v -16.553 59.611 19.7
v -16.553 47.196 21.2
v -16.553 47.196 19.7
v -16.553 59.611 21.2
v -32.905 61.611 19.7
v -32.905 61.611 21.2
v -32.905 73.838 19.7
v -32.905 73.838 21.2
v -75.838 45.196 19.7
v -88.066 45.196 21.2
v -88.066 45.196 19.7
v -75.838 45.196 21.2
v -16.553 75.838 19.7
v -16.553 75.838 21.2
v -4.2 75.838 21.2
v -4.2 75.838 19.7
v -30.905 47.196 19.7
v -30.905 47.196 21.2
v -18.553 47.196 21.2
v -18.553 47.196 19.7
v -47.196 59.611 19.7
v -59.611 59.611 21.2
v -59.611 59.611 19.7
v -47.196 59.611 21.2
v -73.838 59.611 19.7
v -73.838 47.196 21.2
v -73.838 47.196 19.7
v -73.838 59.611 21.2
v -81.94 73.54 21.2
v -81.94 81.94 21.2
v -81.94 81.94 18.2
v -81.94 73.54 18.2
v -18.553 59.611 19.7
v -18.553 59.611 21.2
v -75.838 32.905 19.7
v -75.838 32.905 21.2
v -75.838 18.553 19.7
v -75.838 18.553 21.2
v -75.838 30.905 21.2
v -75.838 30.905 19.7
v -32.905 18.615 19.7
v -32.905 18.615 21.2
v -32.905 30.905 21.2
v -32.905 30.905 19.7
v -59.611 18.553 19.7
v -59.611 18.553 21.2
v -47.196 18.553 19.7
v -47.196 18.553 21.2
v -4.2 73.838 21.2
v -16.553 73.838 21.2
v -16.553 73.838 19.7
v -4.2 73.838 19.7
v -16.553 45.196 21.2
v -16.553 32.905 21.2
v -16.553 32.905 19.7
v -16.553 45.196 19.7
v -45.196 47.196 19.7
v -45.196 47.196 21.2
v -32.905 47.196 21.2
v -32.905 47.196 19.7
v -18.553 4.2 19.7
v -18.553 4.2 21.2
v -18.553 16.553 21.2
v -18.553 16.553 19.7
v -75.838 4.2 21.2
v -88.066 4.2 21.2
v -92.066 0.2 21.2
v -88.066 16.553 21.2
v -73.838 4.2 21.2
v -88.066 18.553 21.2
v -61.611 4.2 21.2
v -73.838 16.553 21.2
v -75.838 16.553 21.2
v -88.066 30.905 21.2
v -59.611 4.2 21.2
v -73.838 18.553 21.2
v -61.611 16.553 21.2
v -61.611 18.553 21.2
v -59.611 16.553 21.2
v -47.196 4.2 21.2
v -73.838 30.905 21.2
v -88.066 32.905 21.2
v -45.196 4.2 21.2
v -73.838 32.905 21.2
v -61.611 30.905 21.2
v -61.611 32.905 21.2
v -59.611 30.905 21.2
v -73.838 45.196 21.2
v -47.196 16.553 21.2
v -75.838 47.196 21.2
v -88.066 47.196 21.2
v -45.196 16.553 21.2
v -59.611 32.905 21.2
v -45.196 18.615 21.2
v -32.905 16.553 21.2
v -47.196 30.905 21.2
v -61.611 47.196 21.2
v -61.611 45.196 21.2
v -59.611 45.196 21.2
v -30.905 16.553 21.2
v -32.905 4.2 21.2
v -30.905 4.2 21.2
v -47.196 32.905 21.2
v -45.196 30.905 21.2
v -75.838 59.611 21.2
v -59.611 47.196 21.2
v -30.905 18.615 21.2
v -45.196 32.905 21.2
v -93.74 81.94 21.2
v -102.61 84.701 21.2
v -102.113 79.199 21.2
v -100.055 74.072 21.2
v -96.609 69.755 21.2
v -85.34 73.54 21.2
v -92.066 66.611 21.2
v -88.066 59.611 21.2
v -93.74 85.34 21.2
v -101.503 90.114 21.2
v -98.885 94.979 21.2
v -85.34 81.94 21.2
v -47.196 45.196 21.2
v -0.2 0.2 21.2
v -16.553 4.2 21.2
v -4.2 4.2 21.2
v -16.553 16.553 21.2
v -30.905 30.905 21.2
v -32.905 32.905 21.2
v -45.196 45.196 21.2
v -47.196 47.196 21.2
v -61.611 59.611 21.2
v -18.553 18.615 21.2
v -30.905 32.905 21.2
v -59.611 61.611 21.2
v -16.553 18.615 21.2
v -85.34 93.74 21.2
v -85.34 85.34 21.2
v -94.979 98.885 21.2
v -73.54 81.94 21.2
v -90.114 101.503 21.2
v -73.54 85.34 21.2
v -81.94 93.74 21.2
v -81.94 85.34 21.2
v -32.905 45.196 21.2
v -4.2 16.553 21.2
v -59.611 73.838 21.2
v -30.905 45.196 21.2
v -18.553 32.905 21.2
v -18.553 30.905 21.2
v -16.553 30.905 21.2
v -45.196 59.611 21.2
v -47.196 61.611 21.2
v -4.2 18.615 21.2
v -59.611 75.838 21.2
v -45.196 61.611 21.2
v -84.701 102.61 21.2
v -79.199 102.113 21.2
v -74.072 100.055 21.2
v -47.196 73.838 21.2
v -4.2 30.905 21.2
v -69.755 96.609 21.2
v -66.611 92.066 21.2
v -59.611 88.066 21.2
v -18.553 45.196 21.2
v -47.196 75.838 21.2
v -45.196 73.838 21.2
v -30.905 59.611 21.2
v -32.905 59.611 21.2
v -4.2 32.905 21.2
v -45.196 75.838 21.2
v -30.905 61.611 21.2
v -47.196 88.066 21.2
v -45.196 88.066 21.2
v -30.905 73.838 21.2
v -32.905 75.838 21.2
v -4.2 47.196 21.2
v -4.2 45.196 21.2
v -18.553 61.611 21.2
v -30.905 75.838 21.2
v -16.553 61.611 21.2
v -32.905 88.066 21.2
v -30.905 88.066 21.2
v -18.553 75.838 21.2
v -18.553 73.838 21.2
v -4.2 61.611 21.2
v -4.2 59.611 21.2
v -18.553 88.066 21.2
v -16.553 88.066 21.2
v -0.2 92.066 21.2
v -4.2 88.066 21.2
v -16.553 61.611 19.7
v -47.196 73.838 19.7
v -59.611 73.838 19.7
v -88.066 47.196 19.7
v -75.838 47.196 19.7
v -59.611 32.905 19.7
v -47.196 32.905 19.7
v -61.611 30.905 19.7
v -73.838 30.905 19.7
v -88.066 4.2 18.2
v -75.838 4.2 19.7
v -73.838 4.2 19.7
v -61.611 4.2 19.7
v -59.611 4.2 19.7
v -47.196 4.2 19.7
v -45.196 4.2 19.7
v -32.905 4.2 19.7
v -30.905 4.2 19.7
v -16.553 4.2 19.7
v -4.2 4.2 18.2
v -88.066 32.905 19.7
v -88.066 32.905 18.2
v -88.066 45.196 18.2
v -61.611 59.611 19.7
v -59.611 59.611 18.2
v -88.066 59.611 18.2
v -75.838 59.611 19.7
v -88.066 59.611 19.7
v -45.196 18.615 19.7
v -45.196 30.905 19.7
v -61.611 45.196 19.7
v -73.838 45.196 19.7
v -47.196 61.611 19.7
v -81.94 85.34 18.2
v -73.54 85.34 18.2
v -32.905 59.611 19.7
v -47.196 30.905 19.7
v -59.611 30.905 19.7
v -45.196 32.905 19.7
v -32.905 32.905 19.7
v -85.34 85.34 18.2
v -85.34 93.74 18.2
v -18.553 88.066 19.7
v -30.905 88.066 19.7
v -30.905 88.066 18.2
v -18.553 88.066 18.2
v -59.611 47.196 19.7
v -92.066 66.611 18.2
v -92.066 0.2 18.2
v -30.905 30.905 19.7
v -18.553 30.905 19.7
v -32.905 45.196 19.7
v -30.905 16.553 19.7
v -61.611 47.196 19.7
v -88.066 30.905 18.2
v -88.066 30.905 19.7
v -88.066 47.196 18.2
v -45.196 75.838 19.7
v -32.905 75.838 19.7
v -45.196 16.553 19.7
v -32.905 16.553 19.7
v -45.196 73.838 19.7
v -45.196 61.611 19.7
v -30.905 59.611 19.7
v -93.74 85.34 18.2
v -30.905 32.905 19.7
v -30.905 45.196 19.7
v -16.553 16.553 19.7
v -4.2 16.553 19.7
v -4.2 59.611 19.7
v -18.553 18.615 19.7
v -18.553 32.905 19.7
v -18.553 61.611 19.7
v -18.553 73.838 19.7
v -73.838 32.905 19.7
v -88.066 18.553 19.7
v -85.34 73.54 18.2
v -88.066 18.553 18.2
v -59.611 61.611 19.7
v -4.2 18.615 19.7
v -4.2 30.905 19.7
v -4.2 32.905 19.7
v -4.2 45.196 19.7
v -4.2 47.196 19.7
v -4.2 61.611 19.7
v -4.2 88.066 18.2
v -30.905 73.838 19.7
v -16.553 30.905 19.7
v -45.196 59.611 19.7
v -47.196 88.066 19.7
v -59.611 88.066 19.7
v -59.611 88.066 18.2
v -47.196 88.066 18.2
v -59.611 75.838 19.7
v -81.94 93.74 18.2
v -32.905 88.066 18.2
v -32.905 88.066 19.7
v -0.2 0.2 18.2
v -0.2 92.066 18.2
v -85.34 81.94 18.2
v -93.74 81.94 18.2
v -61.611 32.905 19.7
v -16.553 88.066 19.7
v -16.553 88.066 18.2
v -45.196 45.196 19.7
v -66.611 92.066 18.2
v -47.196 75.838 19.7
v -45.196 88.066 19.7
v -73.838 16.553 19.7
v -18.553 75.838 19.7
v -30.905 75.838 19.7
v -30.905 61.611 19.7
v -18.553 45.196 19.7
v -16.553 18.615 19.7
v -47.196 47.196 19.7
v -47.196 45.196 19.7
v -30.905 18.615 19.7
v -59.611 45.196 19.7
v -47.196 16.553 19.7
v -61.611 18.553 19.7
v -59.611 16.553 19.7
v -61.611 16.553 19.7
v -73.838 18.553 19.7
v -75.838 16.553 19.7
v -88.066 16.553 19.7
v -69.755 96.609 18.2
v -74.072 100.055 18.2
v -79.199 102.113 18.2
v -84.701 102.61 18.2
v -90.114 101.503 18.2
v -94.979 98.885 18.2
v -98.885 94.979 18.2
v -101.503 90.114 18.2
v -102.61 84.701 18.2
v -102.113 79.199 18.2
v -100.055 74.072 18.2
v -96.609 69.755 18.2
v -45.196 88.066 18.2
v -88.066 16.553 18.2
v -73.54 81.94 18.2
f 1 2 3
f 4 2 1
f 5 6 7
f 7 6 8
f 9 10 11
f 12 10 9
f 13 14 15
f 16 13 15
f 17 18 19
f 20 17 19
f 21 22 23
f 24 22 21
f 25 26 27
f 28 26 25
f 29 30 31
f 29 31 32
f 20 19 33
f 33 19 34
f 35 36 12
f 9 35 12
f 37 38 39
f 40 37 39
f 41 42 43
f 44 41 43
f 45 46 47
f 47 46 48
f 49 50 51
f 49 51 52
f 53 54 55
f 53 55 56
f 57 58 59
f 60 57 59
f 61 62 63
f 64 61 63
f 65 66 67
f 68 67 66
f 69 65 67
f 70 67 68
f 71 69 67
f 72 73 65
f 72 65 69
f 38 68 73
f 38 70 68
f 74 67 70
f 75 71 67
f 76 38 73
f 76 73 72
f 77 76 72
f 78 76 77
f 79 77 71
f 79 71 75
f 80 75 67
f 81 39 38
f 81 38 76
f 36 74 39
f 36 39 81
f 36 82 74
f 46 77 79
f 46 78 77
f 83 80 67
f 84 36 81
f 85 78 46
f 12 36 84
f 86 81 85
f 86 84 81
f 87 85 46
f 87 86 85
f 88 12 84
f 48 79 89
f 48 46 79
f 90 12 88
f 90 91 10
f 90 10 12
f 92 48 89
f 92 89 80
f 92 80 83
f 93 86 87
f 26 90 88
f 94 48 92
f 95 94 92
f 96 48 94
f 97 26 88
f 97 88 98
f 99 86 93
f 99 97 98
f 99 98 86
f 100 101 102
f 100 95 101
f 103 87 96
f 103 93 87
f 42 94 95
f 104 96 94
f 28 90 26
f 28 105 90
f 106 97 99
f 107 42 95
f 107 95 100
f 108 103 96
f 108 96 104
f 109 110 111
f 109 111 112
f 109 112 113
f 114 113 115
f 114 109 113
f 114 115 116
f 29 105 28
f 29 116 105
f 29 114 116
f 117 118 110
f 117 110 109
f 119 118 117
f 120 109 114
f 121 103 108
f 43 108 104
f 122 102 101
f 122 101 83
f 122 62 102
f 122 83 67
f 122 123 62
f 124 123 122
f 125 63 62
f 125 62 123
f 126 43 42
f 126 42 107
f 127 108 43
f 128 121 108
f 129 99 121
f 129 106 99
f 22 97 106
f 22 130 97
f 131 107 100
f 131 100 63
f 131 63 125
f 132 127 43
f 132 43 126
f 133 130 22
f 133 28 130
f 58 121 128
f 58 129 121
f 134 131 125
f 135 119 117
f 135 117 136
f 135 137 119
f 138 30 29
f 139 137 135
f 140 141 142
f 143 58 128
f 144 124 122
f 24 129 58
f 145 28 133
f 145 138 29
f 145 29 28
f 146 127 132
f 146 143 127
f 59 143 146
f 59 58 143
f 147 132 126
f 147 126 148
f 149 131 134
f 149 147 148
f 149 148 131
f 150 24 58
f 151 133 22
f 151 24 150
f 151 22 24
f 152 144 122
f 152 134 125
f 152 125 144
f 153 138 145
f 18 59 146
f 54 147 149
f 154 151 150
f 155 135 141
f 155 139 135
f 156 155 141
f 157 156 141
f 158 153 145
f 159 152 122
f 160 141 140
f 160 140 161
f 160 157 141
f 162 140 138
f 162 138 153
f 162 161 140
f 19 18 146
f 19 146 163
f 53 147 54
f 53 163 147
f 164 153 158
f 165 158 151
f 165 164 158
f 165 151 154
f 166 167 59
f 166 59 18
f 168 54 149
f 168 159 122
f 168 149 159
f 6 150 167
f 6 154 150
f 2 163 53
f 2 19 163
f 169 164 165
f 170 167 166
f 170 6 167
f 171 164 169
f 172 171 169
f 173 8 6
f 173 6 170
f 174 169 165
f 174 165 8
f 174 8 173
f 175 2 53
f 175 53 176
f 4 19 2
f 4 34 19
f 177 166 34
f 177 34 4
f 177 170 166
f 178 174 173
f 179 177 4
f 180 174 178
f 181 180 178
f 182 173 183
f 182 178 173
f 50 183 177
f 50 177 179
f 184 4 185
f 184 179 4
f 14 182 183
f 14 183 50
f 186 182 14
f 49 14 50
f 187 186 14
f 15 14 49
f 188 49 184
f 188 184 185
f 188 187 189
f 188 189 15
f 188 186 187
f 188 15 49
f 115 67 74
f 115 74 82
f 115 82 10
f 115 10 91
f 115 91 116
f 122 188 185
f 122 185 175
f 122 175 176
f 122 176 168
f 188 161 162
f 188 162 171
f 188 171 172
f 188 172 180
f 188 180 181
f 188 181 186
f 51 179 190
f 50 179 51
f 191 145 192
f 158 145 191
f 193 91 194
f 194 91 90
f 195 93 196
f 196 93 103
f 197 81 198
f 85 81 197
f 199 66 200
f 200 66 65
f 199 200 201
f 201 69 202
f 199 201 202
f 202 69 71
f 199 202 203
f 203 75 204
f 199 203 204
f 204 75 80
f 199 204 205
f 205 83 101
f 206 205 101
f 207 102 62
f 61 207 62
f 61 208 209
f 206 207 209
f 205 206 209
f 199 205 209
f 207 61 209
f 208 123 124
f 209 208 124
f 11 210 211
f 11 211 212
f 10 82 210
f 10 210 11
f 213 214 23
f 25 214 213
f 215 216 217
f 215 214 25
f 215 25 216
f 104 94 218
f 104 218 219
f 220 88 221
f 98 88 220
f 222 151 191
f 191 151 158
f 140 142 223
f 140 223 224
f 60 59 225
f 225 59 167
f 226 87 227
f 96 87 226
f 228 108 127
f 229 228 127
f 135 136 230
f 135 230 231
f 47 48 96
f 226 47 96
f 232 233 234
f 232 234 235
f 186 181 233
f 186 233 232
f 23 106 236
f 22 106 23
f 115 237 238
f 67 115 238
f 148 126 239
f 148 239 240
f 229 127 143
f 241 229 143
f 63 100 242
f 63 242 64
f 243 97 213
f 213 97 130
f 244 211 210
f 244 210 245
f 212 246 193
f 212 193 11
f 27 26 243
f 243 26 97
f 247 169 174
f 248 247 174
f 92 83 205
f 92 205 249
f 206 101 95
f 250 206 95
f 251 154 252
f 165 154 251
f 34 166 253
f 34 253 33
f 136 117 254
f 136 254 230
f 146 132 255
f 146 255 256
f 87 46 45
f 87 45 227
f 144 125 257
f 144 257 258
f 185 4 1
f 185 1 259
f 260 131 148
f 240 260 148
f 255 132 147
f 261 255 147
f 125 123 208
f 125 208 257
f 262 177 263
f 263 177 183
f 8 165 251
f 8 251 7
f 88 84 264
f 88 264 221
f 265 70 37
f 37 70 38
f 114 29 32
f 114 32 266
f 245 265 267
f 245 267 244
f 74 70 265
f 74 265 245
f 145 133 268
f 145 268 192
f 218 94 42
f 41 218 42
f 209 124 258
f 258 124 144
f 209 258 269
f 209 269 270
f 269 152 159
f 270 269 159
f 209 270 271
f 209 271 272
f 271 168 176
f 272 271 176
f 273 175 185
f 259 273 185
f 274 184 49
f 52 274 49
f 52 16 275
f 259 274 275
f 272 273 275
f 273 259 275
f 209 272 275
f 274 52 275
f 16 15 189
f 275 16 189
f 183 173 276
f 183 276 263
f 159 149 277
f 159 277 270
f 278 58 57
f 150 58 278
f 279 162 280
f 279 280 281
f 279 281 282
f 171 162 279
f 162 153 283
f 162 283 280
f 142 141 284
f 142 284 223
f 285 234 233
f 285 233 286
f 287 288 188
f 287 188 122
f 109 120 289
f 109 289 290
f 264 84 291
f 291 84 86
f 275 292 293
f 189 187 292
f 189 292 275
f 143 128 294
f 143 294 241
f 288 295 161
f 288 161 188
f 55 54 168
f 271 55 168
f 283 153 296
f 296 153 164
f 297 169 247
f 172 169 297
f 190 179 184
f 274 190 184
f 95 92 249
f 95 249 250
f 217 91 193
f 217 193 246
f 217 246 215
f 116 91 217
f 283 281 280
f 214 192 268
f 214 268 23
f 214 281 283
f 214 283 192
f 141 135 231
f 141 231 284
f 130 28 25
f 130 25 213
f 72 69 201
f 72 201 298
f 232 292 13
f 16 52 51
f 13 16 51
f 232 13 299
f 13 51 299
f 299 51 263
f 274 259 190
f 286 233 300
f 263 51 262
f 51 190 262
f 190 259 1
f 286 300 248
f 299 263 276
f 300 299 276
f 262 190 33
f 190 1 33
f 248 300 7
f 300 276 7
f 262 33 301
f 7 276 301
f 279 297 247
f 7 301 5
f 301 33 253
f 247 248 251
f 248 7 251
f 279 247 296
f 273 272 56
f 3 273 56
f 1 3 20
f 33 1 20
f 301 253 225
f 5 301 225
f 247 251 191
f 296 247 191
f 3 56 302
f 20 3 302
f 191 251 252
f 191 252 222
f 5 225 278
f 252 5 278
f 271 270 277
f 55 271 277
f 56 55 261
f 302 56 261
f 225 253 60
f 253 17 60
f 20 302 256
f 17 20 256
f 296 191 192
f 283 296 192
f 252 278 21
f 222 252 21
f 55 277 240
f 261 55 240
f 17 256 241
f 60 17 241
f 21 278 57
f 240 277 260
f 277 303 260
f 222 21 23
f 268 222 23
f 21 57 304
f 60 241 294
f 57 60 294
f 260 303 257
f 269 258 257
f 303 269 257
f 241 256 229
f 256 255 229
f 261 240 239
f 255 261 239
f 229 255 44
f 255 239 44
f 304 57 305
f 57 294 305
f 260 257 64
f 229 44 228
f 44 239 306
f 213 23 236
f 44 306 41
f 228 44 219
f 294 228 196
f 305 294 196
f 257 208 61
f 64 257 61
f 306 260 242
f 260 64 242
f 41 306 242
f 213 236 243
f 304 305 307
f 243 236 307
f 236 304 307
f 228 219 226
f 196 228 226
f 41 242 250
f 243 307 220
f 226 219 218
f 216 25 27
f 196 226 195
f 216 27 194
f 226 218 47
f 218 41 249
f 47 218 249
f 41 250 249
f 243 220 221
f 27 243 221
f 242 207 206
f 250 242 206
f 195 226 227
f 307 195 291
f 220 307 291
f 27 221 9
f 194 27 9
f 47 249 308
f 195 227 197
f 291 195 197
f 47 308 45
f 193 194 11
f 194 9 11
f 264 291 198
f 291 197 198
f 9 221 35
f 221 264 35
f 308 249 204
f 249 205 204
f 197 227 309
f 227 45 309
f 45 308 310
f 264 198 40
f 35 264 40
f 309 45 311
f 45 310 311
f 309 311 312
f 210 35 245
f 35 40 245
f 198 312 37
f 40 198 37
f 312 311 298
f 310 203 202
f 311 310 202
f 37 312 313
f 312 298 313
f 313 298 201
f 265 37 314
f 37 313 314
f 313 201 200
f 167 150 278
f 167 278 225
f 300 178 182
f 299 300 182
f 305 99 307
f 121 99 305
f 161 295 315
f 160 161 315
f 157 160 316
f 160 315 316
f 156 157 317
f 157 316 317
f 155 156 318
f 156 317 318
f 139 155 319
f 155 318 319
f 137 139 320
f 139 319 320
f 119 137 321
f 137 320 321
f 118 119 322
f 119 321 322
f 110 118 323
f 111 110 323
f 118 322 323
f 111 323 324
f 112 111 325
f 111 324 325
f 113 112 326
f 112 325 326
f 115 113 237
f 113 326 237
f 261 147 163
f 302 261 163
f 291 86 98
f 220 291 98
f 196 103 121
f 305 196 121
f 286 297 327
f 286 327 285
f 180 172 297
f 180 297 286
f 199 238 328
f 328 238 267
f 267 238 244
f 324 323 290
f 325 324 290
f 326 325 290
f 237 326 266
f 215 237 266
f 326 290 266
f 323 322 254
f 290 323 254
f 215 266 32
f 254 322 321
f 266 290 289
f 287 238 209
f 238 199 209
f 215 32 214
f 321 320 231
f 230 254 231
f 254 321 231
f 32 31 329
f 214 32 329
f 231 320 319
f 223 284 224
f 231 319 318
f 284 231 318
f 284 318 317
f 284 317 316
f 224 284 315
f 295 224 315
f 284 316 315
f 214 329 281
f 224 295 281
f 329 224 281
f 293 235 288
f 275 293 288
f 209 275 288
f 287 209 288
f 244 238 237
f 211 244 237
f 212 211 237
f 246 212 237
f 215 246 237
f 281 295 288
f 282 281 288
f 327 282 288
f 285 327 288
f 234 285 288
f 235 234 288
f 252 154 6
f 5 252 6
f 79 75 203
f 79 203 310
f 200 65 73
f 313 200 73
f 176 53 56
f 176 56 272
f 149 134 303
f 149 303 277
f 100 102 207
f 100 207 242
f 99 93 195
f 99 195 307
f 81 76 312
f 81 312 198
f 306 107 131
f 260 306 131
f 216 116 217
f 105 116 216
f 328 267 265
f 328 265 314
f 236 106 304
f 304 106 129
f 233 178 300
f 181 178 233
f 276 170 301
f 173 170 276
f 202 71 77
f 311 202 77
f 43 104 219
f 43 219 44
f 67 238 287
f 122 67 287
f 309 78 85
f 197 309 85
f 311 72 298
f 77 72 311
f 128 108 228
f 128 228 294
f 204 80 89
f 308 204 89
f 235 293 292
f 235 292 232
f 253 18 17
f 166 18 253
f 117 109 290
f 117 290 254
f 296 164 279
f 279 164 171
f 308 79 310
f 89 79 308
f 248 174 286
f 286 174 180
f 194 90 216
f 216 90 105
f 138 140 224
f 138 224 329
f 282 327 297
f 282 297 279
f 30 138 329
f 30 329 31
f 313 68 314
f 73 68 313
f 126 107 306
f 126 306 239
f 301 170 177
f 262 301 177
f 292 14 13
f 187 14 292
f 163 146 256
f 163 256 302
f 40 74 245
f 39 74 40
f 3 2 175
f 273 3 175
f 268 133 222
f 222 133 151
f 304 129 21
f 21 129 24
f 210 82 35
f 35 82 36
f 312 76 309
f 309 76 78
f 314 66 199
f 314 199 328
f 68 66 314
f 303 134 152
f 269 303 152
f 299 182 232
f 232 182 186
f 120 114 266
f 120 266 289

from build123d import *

# Parameters (mm, degrees)
PAD039_DEPTH    = 3
SKETCH067_W     = 12.2279220614
SKETCH067_H     = 12.4149860738
SKETCH067_H_2   = 12.2902767322
SKETCH067_H_3   = 12.352631403
SKETCH067_W_2   = 12.4149860738
SKETCH067_W_3   = 12.2902767322
SKETCH067_W_4   = 12.352631403
SKETCH067_H_4   = 12.2279220614
POCKET027_DEPTH = 3.001
POCKET028_DEPTH = 1.5


with BuildPart() as part:
    # Sketch066 (on Face3 of Binder013) → Pad039 (new body)
    with BuildSketch(Plane.XY.offset(18.2)):
        with BuildLine():
            ThreePointArc((-66.6105256119, 92.0663697346), (-97.0746391493, 97.0746391493), (-92.0663697346, 66.6105256119))
            Line((-92.0663697346, 66.6105256119), (-92.0663697346, 0.2))
            Line((-92.0663697346, 0.2), (-0.2, 0.2))
            Line((-0.2, 92.0663697346), (-0.2, 0.2))
            Line((-66.6105256119, 92.0663697346), (-0.2, 92.0663697346))
        make_face()
    extrude(amount=PAD039_DEPTH)

    # Sketch067 (on Face7 of Pad039) → Pocket027 (cut, through all)
    with BuildSketch(Plane.XY.offset(21.2)):
        Polygon((-93.7396103068, 85.3396103068), (-85.3396103068, 85.3396103068), (-85.3396103068, 93.7396103068), (-81.9396103068, 93.7396103068), (-81.9396103068, 85.3396103068), (-73.5396103068, 85.3396103068), (-73.5396103068, 81.9396103068), (-81.9396103068, 81.9396103068), (-81.9396103068, 73.5396103068), (-85.3396103068, 73.5396103068), (-85.3396103068, 81.9396103068), (-93.7396103068, 81.9396103068), align=None)
        with Locations((-81.9524087039, 53.403032575)):
            Rectangle(SKETCH067_W, SKETCH067_H)
        with Locations((-67.7244866426, 53.403032575)):
            Rectangle(SKETCH067_W, SKETCH067_H)
        with Locations((-81.9524087039, 39.050401172)):
            Rectangle(SKETCH067_W, SKETCH067_H_2)
        with Locations((-67.7244866426, 39.050401172)):
            Rectangle(SKETCH067_W, SKETCH067_H_2)
        with Locations((-81.9524087039, 24.7289471045)):
            Rectangle(SKETCH067_W, SKETCH067_H_3)
        with Locations((-67.7244866426, 24.7289471045)):
            Rectangle(SKETCH067_W, SKETCH067_H_3)
        with Locations((-81.9524087039, 10.3763157015)):
            Rectangle(SKETCH067_W, SKETCH067_H_3)
        with Locations((-67.7244866426, 10.3763157015)):
            Rectangle(SKETCH067_W, SKETCH067_H_3)
        with Locations((-53.403032575, 10.3763157015)):
            Rectangle(SKETCH067_W_2, SKETCH067_H_3)
        with Locations((-39.050401172, 10.3763157015)):
            Rectangle(SKETCH067_W_3, SKETCH067_H_3)
        with Locations((-24.7289471045, 10.3763157015)):
            Rectangle(SKETCH067_W_4, SKETCH067_H_3)
        with Locations((-10.3763157015, 10.3763157015)):
            Rectangle(SKETCH067_W_4, SKETCH067_H_3)
        with Locations((-10.3763157015, 24.7601244399)):
            Rectangle(SKETCH067_W_4, SKETCH067_H_2)
        with Locations((-24.7289471045, 24.7601244399)):
            Rectangle(SKETCH067_W_4, SKETCH067_H_2)
        with Locations((-39.050401172, 24.7601244399)):
            Rectangle(SKETCH067_W_3, SKETCH067_H_2)
        with Locations((-53.403032575, 24.7289471045)):
            Rectangle(SKETCH067_W_2, SKETCH067_H_3)
        with Locations((-53.403032575, 39.050401172)):
            Rectangle(SKETCH067_W_2, SKETCH067_H_2)
        with Locations((-39.050401172, 39.050401172)):
            Rectangle(SKETCH067_W_3, SKETCH067_H_2)
        with Locations((-24.7289471045, 39.050401172)):
            Rectangle(SKETCH067_W_4, SKETCH067_H_2)
        with Locations((-10.3763157015, 39.050401172)):
            Rectangle(SKETCH067_W_4, SKETCH067_H_2)
        with Locations((-10.3763157015, 53.403032575)):
            Rectangle(SKETCH067_W_4, SKETCH067_H)
        with Locations((-24.7289471045, 53.403032575)):
            Rectangle(SKETCH067_W_4, SKETCH067_H)
        with Locations((-39.050401172, 53.403032575)):
            Rectangle(SKETCH067_W_3, SKETCH067_H)
        with Locations((-53.403032575, 53.403032575)):
            Rectangle(SKETCH067_W_2, SKETCH067_H)
        with Locations((-53.403032575, 67.7244866426)):
            Rectangle(SKETCH067_W_2, SKETCH067_H_4)
        with Locations((-39.050401172, 67.7244866426)):
            Rectangle(SKETCH067_W_3, SKETCH067_H_4)
        with Locations((-24.7289471045, 67.7244866426)):
            Rectangle(SKETCH067_W_4, SKETCH067_H_4)
        with Locations((-10.3763157015, 67.7244866426)):
            Rectangle(SKETCH067_W_4, SKETCH067_H_4)
        with Locations((-10.3763157015, 81.9524087039)):
            Rectangle(SKETCH067_W_4, SKETCH067_H_4)
        with Locations((-24.7289471045, 81.9524087039)):
            Rectangle(SKETCH067_W_4, SKETCH067_H_4)
        with Locations((-39.050401172, 81.9524087039)):
            Rectangle(SKETCH067_W_3, SKETCH067_H_4)
        with Locations((-53.403032575, 81.9524087039)):
            Rectangle(SKETCH067_W_2, SKETCH067_H_4)
    extrude(amount=-POCKET027_DEPTH, mode=Mode.SUBTRACT)

    # Sketch068 (on Face4 of Pocket027) → Pocket028 (cut)
    with BuildSketch(Plane(origin=(0, 0, 18.2), x_dir=(1, 0, 0), z_dir=(0, 0, -1))):
        Polygon((-88.06637, -4.2), (-4.2, -4.2), (-4.2, -88.06637), (-59.610526, -88.06637), (-59.610526, -59.610526), (-88.06637, -59.610526), align=None)
    extrude(amount=-POCKET028_DEPTH, mode=Mode.SUBTRACT)


solid = part.part
